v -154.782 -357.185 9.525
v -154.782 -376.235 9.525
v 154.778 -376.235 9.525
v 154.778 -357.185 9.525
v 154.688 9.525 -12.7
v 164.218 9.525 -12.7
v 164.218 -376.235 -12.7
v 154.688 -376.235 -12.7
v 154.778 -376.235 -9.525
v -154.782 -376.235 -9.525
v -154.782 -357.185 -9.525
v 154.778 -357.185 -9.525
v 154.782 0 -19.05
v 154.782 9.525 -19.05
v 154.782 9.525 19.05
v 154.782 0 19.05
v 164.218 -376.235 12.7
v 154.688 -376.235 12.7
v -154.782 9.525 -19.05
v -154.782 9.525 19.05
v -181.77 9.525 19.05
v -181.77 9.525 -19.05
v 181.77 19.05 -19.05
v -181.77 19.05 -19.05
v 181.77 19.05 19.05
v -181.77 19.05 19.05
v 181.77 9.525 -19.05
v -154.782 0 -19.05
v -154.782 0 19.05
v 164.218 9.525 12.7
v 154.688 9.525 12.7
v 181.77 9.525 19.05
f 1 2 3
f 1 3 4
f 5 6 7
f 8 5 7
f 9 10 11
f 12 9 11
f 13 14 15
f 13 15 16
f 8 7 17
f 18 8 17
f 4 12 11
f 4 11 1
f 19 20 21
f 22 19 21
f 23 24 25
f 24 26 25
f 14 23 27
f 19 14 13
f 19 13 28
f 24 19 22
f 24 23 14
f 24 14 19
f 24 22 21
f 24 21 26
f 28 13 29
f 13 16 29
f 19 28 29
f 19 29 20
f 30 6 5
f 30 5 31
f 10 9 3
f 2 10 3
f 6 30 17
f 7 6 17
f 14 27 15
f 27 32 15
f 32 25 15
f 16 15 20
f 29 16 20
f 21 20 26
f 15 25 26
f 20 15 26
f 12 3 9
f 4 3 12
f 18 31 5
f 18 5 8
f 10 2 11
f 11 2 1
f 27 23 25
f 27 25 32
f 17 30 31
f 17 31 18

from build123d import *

# Parameters (mm, degrees)
PAD_DEPTH    = 19.05
SKETCH004_W  = 19.05
SKETCH004_H  = 19.05
PAD006_DEPTH = 309.56
SKETCH001_W  = 385.76
SKETCH001_H  = 25.4
PAD001_DEPTH = 9.525
PAD002_DEPTH = 9.53


with BuildPart() as top_bar:
    # Sketch → Pad (new body, symmetric)
    with BuildSketch(Plane.XY):
        Polygon((-181.77, 9.525), (-181.77, 19.05), (181.77, 19.05), (181.77, 9.525), (154.7825, 9.525), (154.7825, 0), (-154.7825, 0), (-154.7825, 9.525), align=None)
    extrude(amount=PAD_DEPTH, both=True)


with BuildPart() as bottom_bar:
    # Sketch004 (on ShapeBinder) → Pad006 (new body)
    with BuildSketch(Plane.YZ.offset(-154.7825)):
        with Locations((-366.71, 0)):
            Rectangle(SKETCH004_W, SKETCH004_H)
    extrude(amount=PAD006_DEPTH)


with BuildPart() as right_bar:
    # Sketch001 (on ShapeBinder) → Pad001 (new body)
    with BuildSketch(Plane(origin=(-154.7825, 0, 0), x_dir=(0, -1, 0), z_dir=(-1, 0, 0))):
        with Locations((183.355, 0)):
            Rectangle(SKETCH001_W, SKETCH001_H)
    extrude(amount=PAD001_DEPTH)

    # Sketch001 (on ShapeBinder) → Pad002 (join)
    with BuildSketch(Plane(origin=(-154.7825, 0, 0), x_dir=(0, -1, 0), z_dir=(-1, 0, 0))):
        with Locations((183.355, 0)):
            Rectangle(SKETCH001_W, SKETCH001_H)
    extrude(amount=PAD002_DEPTH)


with BuildPart() as right_bar_1:
    # Body005 placement: moved
    add(right_bar.part.moved(Location((319, 0, 0))))


solid = Compound([top_bar.part, bottom_bar.part, right_bar_1.part])
